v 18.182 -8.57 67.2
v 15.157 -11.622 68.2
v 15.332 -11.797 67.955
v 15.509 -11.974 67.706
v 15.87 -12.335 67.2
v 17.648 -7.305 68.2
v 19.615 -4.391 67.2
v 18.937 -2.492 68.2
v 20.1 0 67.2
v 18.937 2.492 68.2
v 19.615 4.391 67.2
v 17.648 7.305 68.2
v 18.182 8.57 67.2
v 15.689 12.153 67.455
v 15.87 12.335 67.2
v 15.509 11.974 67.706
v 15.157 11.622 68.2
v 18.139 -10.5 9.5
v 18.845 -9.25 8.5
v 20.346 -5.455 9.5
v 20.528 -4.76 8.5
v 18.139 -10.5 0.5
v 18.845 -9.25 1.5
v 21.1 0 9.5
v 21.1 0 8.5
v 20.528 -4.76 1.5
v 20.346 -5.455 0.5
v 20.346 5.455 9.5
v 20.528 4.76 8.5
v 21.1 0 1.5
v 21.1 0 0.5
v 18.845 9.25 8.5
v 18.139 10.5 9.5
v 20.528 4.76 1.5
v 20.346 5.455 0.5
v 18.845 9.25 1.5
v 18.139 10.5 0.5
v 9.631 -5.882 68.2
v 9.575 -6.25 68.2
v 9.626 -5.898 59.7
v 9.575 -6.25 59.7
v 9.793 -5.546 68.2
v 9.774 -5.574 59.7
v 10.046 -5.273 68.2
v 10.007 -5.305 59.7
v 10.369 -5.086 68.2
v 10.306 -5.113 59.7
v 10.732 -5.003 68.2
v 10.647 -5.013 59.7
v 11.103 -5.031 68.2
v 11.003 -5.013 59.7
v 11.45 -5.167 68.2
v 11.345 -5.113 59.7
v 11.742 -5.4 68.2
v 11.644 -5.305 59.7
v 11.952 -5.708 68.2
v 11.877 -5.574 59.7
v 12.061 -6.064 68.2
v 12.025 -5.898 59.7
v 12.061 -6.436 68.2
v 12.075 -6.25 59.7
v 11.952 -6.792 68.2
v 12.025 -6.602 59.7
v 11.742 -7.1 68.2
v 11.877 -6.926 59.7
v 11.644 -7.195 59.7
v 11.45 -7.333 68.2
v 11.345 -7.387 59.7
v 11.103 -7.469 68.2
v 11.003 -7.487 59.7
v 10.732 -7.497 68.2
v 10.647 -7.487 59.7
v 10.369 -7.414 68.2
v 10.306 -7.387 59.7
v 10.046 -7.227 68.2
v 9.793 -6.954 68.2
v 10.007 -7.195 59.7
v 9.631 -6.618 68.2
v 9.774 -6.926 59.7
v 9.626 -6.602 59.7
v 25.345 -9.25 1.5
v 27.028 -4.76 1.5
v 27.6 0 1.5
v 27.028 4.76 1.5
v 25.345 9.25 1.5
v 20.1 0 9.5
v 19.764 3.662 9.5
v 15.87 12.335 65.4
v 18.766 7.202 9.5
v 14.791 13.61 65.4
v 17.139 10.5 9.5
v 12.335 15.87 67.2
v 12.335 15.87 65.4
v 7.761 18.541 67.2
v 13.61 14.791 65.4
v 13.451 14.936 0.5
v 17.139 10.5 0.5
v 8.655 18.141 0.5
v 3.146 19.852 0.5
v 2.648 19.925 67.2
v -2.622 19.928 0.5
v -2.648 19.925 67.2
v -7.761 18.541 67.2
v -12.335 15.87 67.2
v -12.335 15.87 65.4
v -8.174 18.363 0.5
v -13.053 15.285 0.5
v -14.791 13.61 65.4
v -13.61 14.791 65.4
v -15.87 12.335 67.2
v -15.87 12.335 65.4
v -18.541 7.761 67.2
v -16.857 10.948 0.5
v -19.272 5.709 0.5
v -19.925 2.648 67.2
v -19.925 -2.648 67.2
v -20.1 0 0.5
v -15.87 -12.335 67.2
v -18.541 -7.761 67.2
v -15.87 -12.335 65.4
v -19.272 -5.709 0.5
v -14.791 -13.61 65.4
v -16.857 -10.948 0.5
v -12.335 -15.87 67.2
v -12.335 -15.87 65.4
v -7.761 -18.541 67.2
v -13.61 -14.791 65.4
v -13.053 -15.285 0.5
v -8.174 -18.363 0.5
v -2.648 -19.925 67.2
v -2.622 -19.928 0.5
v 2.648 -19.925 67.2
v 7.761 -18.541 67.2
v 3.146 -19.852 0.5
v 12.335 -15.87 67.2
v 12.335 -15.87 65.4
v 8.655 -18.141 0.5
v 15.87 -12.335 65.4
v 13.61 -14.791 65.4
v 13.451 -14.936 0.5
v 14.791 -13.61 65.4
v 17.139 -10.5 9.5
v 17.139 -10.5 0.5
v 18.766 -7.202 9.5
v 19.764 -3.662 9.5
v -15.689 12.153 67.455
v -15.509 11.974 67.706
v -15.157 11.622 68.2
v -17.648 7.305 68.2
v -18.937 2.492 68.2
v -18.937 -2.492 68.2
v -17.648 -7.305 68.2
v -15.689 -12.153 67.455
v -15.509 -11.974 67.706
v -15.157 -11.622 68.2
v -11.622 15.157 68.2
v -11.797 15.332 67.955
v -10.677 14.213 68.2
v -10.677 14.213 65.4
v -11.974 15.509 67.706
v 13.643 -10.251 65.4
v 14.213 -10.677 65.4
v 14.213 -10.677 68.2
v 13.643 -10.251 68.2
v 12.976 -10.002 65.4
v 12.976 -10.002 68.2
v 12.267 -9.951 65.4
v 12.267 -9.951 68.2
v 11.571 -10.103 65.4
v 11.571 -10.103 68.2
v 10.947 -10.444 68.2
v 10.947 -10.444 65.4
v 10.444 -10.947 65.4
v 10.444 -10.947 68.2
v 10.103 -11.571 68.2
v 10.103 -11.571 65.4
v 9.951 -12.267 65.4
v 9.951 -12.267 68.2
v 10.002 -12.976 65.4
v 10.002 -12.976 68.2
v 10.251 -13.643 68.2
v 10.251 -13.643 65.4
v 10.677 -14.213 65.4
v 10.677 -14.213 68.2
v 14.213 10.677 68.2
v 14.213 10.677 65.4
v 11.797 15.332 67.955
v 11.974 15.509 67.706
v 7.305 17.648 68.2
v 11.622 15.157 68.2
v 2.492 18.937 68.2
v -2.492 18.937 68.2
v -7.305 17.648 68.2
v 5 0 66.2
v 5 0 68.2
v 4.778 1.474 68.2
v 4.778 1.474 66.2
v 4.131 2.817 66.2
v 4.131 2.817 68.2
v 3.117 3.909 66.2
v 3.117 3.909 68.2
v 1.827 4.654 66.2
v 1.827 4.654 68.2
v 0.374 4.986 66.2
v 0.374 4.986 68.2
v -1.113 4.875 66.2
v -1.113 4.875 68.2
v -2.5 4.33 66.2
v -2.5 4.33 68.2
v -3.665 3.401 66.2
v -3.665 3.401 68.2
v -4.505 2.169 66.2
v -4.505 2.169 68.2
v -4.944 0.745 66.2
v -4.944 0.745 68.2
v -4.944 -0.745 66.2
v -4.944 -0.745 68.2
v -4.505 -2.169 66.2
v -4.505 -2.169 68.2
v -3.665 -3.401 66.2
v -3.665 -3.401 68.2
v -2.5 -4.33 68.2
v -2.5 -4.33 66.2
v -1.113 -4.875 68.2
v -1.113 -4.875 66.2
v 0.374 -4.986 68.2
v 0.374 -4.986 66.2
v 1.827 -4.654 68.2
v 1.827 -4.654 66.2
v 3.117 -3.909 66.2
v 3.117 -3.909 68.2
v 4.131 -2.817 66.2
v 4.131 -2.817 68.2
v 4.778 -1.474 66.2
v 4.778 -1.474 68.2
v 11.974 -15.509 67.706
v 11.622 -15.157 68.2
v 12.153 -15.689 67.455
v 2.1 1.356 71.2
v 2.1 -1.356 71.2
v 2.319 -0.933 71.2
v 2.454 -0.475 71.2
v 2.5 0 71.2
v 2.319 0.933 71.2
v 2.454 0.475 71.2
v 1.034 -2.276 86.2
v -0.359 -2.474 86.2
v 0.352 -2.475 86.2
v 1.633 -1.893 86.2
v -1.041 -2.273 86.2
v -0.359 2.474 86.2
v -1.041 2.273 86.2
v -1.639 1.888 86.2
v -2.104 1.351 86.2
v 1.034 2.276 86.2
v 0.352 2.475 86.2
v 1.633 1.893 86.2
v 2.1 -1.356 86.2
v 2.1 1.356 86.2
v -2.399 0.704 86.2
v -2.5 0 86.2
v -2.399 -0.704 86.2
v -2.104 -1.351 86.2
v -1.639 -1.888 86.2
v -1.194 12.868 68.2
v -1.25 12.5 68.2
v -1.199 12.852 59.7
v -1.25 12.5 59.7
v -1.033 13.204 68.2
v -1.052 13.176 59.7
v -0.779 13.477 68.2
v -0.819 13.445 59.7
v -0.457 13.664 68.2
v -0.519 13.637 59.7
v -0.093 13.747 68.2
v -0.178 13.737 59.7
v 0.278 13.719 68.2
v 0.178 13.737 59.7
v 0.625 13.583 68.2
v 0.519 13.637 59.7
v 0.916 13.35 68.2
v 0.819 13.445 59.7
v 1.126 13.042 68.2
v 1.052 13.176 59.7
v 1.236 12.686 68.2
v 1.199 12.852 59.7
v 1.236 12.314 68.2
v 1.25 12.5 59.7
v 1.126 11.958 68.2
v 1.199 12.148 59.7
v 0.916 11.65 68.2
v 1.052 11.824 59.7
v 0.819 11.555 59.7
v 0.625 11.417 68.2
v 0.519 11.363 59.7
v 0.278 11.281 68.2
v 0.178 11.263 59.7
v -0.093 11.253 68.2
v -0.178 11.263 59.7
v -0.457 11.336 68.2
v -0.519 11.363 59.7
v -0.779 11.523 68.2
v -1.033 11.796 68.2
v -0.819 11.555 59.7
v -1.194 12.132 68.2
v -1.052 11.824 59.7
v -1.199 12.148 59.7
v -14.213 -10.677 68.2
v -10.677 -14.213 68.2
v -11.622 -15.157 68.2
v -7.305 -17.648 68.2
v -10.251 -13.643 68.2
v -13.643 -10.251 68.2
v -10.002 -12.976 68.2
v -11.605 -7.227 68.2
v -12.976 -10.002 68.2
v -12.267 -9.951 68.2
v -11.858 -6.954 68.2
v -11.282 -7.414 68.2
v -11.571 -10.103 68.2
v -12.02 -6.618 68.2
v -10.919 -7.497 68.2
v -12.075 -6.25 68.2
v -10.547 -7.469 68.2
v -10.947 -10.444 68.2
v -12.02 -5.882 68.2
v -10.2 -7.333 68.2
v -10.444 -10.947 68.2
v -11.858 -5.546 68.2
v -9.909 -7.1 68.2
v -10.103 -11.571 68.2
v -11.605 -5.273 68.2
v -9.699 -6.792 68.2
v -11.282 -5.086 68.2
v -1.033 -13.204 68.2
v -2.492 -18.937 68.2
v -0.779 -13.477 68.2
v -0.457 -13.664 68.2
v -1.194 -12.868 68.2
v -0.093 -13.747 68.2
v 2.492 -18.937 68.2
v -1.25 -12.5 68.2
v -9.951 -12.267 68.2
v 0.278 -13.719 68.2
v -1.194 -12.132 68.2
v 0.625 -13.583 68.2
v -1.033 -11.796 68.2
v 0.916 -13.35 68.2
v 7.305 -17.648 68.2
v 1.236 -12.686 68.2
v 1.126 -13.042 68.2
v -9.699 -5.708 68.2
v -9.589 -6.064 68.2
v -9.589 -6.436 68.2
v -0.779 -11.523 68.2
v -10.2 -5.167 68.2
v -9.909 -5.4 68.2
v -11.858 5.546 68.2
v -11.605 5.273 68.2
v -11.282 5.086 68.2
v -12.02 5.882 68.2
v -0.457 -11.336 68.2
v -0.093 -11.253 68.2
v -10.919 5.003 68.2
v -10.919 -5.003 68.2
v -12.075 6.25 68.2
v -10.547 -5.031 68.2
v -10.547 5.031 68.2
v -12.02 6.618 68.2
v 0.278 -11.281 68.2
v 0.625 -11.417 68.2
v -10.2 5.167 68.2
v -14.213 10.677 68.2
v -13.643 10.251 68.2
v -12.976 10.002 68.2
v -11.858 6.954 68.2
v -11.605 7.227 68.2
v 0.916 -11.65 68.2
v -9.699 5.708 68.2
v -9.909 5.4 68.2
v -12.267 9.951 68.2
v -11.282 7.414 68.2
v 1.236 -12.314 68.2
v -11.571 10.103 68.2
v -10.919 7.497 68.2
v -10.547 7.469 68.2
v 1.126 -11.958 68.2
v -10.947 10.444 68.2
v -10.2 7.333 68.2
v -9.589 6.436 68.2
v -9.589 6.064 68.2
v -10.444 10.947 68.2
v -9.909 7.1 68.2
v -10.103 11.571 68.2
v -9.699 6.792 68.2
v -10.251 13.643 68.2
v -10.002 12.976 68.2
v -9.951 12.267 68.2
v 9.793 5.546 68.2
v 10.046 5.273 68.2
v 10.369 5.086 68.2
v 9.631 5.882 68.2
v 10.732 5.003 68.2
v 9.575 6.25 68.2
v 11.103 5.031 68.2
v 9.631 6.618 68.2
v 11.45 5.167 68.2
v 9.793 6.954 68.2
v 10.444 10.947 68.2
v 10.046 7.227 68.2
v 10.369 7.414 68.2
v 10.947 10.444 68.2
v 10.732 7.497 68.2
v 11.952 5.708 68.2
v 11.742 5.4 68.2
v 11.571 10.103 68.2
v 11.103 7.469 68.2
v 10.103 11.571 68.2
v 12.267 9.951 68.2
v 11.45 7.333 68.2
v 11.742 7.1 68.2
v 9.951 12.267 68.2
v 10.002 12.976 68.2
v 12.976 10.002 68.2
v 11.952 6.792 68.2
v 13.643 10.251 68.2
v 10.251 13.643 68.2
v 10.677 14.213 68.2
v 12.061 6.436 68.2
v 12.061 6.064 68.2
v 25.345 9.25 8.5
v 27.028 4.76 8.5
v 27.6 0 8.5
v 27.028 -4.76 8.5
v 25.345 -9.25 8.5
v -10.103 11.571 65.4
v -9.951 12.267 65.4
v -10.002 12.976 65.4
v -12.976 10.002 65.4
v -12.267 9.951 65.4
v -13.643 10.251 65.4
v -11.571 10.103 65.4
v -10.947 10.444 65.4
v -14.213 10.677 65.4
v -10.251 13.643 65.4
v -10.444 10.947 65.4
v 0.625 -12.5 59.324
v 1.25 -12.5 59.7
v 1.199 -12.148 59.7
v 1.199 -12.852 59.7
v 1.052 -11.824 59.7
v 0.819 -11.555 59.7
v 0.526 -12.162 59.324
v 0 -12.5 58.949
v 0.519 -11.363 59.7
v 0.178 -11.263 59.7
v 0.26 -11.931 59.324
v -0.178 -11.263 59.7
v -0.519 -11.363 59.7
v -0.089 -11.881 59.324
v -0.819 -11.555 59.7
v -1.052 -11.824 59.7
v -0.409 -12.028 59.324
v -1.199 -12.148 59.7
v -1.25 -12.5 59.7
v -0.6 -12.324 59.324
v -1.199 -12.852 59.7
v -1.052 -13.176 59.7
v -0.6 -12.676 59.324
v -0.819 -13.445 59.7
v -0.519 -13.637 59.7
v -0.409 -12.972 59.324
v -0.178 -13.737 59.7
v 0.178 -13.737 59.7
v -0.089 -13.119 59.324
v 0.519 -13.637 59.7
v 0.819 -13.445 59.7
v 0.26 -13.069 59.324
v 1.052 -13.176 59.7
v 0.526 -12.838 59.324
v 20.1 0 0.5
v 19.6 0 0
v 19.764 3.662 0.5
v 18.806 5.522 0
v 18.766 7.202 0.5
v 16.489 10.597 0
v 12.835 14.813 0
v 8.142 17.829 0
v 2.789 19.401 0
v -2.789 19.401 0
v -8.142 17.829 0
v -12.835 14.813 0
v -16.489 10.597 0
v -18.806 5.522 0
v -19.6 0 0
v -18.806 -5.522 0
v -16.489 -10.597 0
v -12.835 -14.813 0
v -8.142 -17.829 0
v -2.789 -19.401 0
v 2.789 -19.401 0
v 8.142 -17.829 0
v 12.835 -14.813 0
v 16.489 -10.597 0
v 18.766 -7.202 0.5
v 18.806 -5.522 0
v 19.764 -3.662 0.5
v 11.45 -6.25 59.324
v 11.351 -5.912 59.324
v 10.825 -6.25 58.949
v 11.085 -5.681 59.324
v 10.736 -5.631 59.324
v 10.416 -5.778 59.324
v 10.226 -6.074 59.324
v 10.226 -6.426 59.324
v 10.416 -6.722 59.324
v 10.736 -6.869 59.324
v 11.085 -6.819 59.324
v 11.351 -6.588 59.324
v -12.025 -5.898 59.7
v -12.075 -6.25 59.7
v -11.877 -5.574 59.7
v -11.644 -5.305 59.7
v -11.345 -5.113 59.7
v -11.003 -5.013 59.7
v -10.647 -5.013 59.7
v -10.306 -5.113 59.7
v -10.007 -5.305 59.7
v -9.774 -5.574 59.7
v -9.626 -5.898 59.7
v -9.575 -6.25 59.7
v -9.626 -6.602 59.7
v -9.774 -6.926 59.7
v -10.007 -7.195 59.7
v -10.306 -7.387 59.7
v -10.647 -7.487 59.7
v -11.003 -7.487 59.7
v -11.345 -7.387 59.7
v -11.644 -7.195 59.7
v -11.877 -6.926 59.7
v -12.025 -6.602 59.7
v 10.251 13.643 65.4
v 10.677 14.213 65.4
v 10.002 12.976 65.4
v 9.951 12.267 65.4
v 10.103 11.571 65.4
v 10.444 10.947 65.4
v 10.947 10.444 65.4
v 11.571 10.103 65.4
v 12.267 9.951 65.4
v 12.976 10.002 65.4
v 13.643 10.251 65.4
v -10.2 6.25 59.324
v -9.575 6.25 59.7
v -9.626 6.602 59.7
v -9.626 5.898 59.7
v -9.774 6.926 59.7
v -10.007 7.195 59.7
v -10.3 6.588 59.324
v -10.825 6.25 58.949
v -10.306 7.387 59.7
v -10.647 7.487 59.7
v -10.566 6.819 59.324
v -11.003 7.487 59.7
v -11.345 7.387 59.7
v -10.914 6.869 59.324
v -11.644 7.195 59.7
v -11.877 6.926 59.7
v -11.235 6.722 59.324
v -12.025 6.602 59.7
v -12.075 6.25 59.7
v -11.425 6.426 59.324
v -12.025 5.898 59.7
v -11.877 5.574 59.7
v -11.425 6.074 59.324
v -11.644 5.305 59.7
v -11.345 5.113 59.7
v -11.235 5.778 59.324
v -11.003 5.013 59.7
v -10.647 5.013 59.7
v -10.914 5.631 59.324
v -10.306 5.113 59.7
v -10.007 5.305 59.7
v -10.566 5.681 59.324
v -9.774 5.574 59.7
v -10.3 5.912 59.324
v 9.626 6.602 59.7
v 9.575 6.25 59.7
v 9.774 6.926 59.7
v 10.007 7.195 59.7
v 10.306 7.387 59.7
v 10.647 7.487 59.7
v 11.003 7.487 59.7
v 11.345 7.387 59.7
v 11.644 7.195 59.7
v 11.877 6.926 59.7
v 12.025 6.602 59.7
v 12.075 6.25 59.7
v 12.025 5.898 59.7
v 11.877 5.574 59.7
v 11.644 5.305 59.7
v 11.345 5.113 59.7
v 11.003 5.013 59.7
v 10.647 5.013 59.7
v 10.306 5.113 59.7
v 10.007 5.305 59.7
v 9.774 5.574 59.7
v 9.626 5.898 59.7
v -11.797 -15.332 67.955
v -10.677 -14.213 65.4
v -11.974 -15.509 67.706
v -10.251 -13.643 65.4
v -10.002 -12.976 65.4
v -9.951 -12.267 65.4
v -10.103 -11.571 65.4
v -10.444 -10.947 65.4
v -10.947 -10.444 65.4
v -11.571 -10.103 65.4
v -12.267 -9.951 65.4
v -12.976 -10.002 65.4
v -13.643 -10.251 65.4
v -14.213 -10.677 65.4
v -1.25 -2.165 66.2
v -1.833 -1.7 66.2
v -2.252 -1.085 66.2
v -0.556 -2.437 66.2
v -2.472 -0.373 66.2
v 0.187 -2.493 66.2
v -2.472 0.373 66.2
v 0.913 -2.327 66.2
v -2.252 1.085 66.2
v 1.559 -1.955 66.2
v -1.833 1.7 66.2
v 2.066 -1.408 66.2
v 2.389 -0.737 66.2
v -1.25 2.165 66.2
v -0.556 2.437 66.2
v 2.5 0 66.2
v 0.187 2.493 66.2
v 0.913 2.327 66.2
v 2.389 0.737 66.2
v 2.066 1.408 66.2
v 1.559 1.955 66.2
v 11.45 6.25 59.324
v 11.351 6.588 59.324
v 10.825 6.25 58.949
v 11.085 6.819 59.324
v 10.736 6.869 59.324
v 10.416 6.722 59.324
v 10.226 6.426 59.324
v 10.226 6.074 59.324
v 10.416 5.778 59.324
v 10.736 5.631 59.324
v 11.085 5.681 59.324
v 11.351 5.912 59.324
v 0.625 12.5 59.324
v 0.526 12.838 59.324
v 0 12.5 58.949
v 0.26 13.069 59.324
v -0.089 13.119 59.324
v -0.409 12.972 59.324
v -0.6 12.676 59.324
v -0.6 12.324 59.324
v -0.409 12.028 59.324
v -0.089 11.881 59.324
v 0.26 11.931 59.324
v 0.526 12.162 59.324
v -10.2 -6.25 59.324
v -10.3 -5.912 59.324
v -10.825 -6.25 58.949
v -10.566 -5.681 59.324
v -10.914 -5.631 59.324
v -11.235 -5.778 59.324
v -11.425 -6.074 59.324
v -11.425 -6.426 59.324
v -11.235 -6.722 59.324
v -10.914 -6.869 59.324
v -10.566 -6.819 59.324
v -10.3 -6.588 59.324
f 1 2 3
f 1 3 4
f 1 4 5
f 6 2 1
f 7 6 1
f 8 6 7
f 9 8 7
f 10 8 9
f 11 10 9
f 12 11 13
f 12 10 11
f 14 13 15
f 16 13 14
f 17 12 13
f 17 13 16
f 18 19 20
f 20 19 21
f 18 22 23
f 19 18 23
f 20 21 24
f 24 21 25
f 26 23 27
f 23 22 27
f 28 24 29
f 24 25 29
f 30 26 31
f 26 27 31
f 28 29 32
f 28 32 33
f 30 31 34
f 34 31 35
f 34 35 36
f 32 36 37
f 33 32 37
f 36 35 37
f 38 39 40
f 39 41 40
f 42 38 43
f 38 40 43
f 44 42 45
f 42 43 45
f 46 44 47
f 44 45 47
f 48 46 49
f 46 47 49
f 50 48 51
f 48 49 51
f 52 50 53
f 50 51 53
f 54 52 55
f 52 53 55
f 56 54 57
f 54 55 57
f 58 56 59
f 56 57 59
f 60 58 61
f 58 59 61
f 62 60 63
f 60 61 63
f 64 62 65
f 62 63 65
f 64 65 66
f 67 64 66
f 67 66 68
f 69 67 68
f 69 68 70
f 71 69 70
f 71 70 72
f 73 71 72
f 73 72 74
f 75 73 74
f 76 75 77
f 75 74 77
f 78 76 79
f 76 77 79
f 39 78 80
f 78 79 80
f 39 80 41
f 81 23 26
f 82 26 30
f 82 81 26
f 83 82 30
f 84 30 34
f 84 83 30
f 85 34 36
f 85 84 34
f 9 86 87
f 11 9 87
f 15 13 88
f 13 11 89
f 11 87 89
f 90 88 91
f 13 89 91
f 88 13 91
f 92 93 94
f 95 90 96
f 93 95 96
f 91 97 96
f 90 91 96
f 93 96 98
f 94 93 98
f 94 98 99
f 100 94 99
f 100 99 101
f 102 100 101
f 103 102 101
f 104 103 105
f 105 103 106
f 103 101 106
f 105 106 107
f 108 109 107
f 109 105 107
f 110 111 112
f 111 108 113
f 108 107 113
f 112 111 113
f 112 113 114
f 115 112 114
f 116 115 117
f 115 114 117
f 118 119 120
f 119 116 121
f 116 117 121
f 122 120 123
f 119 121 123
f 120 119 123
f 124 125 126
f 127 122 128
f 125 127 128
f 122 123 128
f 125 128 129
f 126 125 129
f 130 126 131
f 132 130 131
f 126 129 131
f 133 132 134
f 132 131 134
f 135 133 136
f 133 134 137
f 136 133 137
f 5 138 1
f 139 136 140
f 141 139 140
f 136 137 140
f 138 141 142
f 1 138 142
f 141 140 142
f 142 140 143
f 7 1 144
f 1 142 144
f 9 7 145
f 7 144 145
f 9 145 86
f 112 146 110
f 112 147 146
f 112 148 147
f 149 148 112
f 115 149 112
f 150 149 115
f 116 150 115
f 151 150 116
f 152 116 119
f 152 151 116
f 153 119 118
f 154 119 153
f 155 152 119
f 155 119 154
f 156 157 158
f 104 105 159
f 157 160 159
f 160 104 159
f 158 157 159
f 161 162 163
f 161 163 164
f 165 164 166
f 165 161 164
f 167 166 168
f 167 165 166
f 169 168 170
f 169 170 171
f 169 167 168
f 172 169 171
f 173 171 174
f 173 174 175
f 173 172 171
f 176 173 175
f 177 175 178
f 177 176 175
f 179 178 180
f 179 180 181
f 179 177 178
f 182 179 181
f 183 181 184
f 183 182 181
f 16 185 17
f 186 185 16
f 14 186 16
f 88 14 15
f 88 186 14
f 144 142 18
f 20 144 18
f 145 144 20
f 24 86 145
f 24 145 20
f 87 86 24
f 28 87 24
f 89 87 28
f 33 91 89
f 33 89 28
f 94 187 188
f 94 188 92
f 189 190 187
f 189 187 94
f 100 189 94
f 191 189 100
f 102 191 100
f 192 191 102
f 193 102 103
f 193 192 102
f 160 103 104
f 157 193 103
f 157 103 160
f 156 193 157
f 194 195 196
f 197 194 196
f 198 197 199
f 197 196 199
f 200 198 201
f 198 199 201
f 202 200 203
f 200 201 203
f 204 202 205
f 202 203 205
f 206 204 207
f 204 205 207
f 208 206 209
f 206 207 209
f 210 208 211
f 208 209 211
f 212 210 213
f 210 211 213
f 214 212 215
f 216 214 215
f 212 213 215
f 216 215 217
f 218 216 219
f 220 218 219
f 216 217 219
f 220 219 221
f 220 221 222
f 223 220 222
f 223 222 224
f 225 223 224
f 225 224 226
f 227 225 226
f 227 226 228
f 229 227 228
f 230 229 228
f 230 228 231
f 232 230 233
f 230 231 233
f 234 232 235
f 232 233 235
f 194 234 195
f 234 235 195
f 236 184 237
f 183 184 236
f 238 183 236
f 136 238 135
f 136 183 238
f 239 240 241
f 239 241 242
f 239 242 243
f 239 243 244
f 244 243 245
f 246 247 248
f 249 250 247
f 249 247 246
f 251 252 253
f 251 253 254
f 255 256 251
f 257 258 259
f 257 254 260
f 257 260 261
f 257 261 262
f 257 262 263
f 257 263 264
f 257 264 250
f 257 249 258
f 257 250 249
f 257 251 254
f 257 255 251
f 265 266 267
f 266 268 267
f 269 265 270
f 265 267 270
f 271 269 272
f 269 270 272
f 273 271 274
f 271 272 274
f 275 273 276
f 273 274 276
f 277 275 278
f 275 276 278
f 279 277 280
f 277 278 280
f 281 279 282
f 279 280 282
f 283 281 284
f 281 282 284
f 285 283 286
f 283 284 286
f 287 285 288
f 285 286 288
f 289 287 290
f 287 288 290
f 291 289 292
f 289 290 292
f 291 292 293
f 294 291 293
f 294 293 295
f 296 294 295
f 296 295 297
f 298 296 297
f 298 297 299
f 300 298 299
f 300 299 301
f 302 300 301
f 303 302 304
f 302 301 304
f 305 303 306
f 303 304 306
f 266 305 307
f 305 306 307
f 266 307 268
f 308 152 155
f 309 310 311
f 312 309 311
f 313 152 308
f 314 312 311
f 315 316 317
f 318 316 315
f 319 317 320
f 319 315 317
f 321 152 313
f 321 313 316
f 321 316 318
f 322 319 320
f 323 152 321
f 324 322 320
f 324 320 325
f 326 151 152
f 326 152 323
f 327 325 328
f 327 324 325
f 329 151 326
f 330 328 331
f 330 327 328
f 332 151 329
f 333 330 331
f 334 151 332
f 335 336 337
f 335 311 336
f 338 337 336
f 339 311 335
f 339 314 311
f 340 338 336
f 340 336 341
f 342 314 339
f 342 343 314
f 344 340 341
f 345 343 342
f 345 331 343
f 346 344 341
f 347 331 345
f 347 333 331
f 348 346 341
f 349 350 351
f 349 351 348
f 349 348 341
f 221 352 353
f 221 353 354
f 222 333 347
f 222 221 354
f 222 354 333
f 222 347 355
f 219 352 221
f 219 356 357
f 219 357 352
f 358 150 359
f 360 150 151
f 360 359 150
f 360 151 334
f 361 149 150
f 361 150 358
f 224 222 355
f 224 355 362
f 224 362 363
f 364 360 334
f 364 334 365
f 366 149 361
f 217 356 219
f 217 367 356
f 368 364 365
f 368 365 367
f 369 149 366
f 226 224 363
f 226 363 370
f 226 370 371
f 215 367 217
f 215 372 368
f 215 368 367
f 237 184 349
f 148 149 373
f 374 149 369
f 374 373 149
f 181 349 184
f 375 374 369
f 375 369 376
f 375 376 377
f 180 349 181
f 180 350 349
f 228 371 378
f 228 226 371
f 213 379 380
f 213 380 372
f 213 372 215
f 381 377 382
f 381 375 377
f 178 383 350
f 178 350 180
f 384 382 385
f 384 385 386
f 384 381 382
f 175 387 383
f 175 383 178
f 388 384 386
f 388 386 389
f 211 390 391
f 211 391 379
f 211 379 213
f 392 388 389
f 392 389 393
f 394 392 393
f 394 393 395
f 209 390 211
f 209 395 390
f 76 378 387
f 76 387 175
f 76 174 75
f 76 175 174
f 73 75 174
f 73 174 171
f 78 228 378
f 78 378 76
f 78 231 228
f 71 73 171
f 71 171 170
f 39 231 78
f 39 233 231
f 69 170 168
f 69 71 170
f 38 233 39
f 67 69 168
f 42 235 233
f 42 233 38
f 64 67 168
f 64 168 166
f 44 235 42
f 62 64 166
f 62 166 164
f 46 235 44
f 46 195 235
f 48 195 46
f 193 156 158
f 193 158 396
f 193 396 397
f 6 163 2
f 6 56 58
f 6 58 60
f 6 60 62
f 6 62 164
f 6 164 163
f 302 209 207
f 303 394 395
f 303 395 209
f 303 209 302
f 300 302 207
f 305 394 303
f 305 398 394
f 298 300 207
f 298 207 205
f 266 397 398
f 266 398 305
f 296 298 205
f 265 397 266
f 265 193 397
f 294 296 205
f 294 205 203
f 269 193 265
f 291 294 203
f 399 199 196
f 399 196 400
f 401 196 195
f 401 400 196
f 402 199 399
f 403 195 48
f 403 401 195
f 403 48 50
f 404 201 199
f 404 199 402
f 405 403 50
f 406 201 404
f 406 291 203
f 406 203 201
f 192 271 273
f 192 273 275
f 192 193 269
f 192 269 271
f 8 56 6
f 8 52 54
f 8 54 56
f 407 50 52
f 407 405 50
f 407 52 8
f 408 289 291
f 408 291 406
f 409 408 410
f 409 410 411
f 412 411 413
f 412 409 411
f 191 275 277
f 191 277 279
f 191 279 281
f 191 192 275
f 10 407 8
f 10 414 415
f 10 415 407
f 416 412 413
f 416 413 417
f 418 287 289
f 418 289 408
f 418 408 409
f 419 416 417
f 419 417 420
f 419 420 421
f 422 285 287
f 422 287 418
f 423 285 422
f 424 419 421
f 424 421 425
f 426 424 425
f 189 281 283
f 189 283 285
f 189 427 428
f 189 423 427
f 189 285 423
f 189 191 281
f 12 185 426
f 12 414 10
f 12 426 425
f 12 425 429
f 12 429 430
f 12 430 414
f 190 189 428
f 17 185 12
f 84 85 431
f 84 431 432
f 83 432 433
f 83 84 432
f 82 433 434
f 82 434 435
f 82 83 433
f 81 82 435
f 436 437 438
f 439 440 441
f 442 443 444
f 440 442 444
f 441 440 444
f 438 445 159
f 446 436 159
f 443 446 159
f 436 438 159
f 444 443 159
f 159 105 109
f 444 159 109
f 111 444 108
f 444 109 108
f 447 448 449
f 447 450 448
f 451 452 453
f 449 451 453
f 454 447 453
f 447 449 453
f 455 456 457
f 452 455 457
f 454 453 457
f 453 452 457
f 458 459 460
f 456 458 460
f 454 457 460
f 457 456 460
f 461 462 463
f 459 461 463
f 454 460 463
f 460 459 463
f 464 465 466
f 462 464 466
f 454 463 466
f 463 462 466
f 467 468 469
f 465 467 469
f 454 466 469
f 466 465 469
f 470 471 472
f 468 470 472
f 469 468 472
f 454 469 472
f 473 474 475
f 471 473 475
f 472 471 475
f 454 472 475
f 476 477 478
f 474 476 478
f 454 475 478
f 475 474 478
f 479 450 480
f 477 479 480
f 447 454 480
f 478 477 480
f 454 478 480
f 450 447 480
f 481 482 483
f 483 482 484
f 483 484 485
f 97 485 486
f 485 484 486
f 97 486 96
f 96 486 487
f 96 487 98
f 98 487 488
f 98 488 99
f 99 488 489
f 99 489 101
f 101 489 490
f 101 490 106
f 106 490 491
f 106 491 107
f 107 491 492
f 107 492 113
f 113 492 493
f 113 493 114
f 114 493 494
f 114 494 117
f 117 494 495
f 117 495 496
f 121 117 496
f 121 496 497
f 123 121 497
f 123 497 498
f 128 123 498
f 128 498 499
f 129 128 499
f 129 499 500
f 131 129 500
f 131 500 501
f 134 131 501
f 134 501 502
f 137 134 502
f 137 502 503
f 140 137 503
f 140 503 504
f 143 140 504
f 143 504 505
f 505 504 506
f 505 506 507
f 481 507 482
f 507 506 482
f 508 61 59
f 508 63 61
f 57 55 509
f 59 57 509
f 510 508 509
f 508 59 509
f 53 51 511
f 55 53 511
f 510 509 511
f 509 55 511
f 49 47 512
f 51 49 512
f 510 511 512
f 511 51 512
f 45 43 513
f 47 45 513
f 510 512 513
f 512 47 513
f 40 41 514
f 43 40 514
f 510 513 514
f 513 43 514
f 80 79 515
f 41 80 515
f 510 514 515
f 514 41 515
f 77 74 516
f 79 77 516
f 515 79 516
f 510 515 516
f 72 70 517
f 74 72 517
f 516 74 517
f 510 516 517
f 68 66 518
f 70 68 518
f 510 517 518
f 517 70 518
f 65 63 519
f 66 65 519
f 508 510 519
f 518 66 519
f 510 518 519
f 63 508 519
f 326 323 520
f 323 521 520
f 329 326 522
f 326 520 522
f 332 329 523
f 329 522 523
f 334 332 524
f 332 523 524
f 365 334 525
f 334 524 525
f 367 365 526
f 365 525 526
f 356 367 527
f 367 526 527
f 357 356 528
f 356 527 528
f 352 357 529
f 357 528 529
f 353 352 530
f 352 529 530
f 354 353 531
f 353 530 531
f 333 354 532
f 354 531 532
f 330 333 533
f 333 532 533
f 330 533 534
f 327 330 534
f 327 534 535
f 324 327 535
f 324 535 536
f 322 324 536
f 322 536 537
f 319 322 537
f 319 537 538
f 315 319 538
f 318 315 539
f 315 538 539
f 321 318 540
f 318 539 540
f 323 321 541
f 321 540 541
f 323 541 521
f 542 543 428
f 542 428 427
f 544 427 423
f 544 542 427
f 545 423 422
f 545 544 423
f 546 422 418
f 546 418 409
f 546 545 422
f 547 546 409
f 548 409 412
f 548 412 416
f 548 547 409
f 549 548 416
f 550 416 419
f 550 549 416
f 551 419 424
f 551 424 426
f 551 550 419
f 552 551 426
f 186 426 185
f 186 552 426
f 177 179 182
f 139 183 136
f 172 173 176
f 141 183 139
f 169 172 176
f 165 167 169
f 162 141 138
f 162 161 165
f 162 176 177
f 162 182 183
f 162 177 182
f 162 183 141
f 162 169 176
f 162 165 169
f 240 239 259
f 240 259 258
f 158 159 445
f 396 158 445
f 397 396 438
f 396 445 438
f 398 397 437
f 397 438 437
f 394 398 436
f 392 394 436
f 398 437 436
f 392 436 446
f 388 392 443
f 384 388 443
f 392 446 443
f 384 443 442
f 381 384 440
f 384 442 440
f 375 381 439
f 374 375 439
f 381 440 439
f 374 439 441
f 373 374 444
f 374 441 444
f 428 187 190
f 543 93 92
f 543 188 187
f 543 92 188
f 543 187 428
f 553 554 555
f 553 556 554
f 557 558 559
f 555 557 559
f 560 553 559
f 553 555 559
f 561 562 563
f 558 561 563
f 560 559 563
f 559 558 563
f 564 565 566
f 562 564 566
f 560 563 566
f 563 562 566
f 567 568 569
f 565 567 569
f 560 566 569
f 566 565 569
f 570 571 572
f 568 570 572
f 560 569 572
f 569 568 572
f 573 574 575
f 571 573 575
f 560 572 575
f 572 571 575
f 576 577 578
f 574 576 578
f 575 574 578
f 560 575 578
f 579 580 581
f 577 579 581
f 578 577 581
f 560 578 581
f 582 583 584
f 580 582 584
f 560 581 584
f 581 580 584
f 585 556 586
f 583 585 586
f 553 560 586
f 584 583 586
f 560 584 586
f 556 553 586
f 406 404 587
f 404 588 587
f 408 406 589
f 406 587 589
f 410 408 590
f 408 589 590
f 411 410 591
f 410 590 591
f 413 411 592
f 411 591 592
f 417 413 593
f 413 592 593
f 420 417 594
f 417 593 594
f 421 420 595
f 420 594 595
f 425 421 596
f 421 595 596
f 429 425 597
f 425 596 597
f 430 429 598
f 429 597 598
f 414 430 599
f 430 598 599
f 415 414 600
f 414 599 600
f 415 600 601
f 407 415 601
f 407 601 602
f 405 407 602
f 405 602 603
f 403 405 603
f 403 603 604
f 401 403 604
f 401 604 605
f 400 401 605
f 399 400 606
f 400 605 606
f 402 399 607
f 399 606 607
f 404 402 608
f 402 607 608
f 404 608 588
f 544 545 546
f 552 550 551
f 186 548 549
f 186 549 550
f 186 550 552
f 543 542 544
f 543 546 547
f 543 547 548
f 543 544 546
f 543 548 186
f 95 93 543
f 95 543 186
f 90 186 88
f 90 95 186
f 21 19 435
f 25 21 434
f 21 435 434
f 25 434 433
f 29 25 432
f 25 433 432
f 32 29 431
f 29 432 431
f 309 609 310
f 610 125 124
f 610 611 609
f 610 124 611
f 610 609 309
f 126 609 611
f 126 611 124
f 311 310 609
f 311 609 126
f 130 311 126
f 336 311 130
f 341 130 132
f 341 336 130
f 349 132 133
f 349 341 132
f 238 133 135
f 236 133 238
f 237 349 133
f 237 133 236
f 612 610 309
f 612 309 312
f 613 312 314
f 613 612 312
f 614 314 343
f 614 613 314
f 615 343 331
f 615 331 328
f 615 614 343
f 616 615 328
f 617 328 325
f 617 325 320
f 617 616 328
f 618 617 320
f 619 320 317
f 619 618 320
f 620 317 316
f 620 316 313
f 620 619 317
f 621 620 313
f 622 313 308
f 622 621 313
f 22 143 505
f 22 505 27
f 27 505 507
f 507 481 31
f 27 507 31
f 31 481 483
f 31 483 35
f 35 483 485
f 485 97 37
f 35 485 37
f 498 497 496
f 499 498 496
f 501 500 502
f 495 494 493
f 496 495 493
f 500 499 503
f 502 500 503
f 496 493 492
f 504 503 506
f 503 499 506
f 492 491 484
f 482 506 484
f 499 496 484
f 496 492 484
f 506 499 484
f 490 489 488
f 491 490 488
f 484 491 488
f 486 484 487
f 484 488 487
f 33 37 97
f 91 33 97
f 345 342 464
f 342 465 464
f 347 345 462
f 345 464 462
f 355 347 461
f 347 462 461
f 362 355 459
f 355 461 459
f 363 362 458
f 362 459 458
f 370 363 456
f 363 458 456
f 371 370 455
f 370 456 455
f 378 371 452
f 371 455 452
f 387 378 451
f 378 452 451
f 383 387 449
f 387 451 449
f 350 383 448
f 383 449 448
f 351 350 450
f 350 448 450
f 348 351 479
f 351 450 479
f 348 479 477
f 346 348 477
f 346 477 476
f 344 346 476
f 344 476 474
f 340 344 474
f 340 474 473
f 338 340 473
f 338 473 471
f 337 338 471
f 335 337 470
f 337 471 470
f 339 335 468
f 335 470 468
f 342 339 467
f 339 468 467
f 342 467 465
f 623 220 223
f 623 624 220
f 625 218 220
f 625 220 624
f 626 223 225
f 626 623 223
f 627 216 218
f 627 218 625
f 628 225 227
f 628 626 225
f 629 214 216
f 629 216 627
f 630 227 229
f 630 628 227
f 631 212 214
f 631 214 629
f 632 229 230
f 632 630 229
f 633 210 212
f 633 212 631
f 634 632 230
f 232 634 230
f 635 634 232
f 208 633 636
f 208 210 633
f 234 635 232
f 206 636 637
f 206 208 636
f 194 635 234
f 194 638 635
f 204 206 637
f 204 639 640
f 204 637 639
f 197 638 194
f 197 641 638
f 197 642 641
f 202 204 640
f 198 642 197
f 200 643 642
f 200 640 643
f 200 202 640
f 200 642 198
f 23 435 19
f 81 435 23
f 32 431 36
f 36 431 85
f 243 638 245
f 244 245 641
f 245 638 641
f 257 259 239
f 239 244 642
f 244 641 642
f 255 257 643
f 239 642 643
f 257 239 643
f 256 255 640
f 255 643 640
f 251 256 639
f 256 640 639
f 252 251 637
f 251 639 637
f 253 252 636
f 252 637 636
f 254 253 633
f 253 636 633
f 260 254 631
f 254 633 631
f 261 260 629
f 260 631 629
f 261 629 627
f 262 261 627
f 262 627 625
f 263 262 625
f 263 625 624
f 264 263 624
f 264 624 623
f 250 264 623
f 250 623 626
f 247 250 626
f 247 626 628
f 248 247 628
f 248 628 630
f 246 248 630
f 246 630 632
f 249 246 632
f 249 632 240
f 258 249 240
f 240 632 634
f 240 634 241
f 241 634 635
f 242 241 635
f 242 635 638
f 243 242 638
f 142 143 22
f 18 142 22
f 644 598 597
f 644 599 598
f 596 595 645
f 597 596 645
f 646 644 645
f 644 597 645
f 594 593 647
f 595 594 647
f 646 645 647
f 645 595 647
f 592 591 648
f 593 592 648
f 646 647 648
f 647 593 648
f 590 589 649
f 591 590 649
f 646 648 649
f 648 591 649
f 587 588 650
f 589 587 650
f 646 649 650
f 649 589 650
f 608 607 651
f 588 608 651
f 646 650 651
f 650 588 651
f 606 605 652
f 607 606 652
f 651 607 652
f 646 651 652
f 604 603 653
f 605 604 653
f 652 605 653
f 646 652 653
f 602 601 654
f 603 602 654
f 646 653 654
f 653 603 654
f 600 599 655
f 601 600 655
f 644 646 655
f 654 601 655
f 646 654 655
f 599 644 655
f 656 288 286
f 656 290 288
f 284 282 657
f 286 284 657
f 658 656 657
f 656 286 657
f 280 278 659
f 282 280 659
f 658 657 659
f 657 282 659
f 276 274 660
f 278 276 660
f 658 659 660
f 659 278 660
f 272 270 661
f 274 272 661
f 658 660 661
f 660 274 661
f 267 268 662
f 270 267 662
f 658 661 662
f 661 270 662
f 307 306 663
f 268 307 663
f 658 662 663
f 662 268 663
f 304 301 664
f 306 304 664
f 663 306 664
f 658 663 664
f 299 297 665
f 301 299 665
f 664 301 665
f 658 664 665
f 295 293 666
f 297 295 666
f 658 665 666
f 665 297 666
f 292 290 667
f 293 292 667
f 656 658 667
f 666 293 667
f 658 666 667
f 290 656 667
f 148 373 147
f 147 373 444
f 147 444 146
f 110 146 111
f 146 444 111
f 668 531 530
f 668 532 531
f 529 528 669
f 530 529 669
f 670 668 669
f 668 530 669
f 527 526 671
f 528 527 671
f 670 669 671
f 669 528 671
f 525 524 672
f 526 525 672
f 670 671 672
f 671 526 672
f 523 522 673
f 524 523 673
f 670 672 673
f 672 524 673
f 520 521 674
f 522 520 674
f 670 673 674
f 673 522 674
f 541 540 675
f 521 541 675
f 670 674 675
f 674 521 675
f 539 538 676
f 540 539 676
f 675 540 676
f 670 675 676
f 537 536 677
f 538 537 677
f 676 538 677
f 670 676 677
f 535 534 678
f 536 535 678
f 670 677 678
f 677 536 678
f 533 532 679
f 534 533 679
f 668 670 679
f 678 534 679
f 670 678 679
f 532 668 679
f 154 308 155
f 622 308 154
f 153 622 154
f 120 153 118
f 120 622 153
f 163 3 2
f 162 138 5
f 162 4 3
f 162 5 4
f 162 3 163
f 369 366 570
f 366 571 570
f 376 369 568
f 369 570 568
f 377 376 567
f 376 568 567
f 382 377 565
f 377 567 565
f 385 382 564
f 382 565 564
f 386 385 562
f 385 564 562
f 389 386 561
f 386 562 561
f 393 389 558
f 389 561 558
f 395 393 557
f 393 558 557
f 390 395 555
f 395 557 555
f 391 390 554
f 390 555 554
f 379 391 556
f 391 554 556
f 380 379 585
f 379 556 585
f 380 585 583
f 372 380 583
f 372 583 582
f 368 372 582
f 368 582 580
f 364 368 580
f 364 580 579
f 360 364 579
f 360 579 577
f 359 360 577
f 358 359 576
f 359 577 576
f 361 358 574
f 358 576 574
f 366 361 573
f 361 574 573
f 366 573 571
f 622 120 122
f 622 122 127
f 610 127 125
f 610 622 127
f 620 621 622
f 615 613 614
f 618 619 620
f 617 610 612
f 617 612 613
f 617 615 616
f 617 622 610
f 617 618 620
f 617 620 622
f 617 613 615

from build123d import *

# Parameters (mm, degrees)
SKETCH_1_R             = 20.1
EXTRUDE_1_DEPTH        = 68.2
SKETCH_2_R             = 5
CUT_EXTRUDE_1_DEPTH    = 2
SKETCH_3_R             = 2.5
EXTRUDE_2_DEPTH        = 20
CUT_EXTRUDE_START      = -15
CUT_EXTRUDE_2_DEPTH    = 15
CHAMFER_1_SIZE         = 1
M3X0_51_D              = 2.5
M3X0_51_DEPTH          = 8.5
M3X0_51_TIP            = 0.751075774
CUT_EXTRUDE_START_2    = -2.8
CUT_EXTRUDE_3_DEPTH    = 2.8
CHAMFER_2_SIZE         = 0.5
EXTRUDE_5_REACH        = 104.708
EXTRUDE_5_START_RADIUS = 20.1
EXTRUDE_5_END_RADIUS   = 20.1
SKETCH_9_W             = 9
SKETCH_9_H             = 21
EXTRUDE_6_REACH        = 110.208
EXTRUDE_6_START_RADIUS = 20.1
EXTRUDE_6_END_RADIUS   = 20.1
SKETCH_10_W            = 7
SKETCH_10_H            = 18.5


with BuildPart() as part:
    # Эскиз1 → Бобышка-Вытянуть1 (new body)
    with BuildSketch(Plane.XY):
        Circle(SKETCH_1_R)
    extrude(amount=EXTRUDE_1_DEPTH)

    # Эскиз2 → Вырез-Вытянуть1 (cut)
    with BuildSketch(Plane.XY.offset(68.2)):
        Circle(SKETCH_2_R)
    extrude(amount=-CUT_EXTRUDE_1_DEPTH, mode=Mode.SUBTRACT)

    # Эскиз3 → Бобышка-Вытянуть2 (add)
    with BuildSketch(Plane.XY.offset(66.2)):
        Circle(SKETCH_3_R)
    extrude(amount=EXTRUDE_2_DEPTH)

    # Эскиз4 → Вырез-Вытянуть2 (cut)
    with BuildSketch(Plane.XY.offset(86.2).offset(CUT_EXTRUDE_START)):
        with BuildLine():
            Line((2.1, 1.356465997), (2.1, -1.356465997))
            ThreePointArc((2.1, -1.356465997), (2.5, 0), (2.1, 1.356465997))
        make_face()
    extrude(amount=CUT_EXTRUDE_2_DEPTH, mode=Mode.SUBTRACT)

    # Фаска1
    chamfer_1_edges = [part.edges().sort_by_distance(p)[0] for p in [
        (-20.1, 0, 68.2),
    ]]
    chamfer(chamfer_1_edges, length=CHAMFER_1_SIZE)

    # Отверстие обработанное метчиком M3x0.51
    with Locations(Plane.XY.offset(68.2)):
        with Locations((-10.825317547, 6.25), (0, 12.5), (10.825317547, 6.25), (10.825317547, -6.25), (0, -12.5), (-10.825317547, -6.25)):
            Hole(M3X0_51_D / 2, depth=M3X0_51_DEPTH)
            with Locations((0, 0, -(M3X0_51_DEPTH + M3X0_51_TIP / 2))):  # 118° drill point
                Cone(0, M3X0_51_D / 2, M3X0_51_TIP, mode=Mode.SUBTRACT)

    # Эскиз8 → Вырез-Вытянуть3 (cut)
    with BuildSketch(Plane.XY.offset(68.2).offset(CUT_EXTRUDE_START_2)):
        with BuildLine():
            Line((-14.212846302, 10.677312396), (-15.870249004, 12.334715098))
            ThreePointArc((-15.870249004, 12.334715098), (-14.212846302, 14.212846302), (-12.334715098, 15.870249004))
            Line((-12.334715098, 15.870249004), (-10.677312396, 14.212846302))
            ThreePointArc((-10.677312396, 14.212846302), (-10.677312396, 10.677312396), (-14.212846302, 10.677312396))
        make_face()
        with BuildLine():
            Line((14.212846302, 10.677312396), (15.870249004, 12.334715098))
            ThreePointArc((15.870249004, 12.334715098), (14.212846302, 14.212846302), (12.334715098, 15.870249004))
            Line((12.334715098, 15.870249004), (10.677312396, 14.212846302))
            ThreePointArc((10.677312396, 14.212846302), (10.677312396, 10.677312396), (14.212846302, 10.677312396))
        make_face()
        with BuildLine():
            Line((10.677312396, -14.212846302), (12.334715098, -15.870249004))
            ThreePointArc((12.334715098, -15.870249004), (14.212846302, -14.212846302), (15.870249004, -12.334715098))
            Line((15.870249004, -12.334715098), (14.212846302, -10.677312396))
            ThreePointArc((14.212846302, -10.677312396), (10.677312396, -10.677312396), (10.677312396, -14.212846302))
        make_face()
        with BuildLine():
            Line((-14.212846302, -10.677312396), (-15.870249004, -12.334715098))
            ThreePointArc((-15.870249004, -12.334715098), (-14.212846302, -14.212846302), (-12.334715098, -15.870249004))
            Line((-12.334715098, -15.870249004), (-10.677312396, -14.212846302))
            ThreePointArc((-10.677312396, -14.212846302), (-10.677312396, -10.677312396), (-14.212846302, -10.677312396))
        make_face()
    extrude(amount=CUT_EXTRUDE_3_DEPTH, mode=Mode.SUBTRACT)

    # Фаска2
    chamfer_2_edges = [part.edges().sort_by_distance(p)[0] for p in [
        (-20.1, 0, 0),
    ]]
    chamfer(chamfer_2_edges, length=CHAMFER_2_SIZE)

    # Бобышка-Вытянуть5: from a cylinder face, 104.708 long prism both ways, kept between that surface and its translate by the depth
    extrude_5_start = Plane(origin=(0, 0, 5), z_dir=(0, 0, -1)) * Cylinder(EXTRUDE_5_START_RADIUS, 250.616, mode=Mode.PRIVATE)
    extrude_5_end = Plane(origin=(1, 0, 5), z_dir=(0, 0, -1)) * Cylinder(EXTRUDE_5_END_RADIUS, 250.616, mode=Mode.PRIVATE)
    # Эскиз9 → Бобышка-Вытянуть5 (add, from a surface)
    with BuildSketch(Plane(origin=(30, 0, 0), x_dir=(0, 0, -1), z_dir=(1, 0, 0)), mode=Mode.PRIVATE) as extrude_5_sk1:
        with Locations((-5, 0)):
            Rectangle(SKETCH_9_W, SKETCH_9_H)
    extrude_5_tool1 = extrude(extrude_5_sk1.sketch, amount=EXTRUDE_5_REACH, both=True, mode=Mode.PRIVATE)
    add(((extrude_5_tool1 - extrude_5_start) & extrude_5_end).solids().sort_by_distance((20.1, 0, 0.5))[0])

    # Бобышка-Вытянуть6: from a cylinder face, 110.208 long prism both ways, kept between that surface and its translate by the depth
    extrude_6_start = Plane(origin=(1, 0, 5), z_dir=(0, 0, -1)) * Cylinder(EXTRUDE_6_START_RADIUS, 261.616, mode=Mode.PRIVATE)
    extrude_6_end = Plane(origin=(7.5, 0, 5), z_dir=(0, 0, -1)) * Cylinder(EXTRUDE_6_END_RADIUS, 261.616, mode=Mode.PRIVATE)
    # Эскиз10 → Бобышка-Вытянуть6 (add, from a surface)
    with BuildSketch(Plane(origin=(30, 0, 0), x_dir=(0, 0, -1), z_dir=(1, 0, 0)), mode=Mode.PRIVATE) as extrude_6_sk1:
        with Locations((-5, 0)):
            Rectangle(SKETCH_10_W, SKETCH_10_H)
    extrude_6_tool1 = extrude(extrude_6_sk1.sketch, amount=EXTRUDE_6_REACH, both=True, mode=Mode.PRIVATE)
    add(((extrude_6_tool1 - extrude_6_start) & extrude_6_end).solids().sort_by_distance((19.619714, 0, 5))[0])


solid = part.part
